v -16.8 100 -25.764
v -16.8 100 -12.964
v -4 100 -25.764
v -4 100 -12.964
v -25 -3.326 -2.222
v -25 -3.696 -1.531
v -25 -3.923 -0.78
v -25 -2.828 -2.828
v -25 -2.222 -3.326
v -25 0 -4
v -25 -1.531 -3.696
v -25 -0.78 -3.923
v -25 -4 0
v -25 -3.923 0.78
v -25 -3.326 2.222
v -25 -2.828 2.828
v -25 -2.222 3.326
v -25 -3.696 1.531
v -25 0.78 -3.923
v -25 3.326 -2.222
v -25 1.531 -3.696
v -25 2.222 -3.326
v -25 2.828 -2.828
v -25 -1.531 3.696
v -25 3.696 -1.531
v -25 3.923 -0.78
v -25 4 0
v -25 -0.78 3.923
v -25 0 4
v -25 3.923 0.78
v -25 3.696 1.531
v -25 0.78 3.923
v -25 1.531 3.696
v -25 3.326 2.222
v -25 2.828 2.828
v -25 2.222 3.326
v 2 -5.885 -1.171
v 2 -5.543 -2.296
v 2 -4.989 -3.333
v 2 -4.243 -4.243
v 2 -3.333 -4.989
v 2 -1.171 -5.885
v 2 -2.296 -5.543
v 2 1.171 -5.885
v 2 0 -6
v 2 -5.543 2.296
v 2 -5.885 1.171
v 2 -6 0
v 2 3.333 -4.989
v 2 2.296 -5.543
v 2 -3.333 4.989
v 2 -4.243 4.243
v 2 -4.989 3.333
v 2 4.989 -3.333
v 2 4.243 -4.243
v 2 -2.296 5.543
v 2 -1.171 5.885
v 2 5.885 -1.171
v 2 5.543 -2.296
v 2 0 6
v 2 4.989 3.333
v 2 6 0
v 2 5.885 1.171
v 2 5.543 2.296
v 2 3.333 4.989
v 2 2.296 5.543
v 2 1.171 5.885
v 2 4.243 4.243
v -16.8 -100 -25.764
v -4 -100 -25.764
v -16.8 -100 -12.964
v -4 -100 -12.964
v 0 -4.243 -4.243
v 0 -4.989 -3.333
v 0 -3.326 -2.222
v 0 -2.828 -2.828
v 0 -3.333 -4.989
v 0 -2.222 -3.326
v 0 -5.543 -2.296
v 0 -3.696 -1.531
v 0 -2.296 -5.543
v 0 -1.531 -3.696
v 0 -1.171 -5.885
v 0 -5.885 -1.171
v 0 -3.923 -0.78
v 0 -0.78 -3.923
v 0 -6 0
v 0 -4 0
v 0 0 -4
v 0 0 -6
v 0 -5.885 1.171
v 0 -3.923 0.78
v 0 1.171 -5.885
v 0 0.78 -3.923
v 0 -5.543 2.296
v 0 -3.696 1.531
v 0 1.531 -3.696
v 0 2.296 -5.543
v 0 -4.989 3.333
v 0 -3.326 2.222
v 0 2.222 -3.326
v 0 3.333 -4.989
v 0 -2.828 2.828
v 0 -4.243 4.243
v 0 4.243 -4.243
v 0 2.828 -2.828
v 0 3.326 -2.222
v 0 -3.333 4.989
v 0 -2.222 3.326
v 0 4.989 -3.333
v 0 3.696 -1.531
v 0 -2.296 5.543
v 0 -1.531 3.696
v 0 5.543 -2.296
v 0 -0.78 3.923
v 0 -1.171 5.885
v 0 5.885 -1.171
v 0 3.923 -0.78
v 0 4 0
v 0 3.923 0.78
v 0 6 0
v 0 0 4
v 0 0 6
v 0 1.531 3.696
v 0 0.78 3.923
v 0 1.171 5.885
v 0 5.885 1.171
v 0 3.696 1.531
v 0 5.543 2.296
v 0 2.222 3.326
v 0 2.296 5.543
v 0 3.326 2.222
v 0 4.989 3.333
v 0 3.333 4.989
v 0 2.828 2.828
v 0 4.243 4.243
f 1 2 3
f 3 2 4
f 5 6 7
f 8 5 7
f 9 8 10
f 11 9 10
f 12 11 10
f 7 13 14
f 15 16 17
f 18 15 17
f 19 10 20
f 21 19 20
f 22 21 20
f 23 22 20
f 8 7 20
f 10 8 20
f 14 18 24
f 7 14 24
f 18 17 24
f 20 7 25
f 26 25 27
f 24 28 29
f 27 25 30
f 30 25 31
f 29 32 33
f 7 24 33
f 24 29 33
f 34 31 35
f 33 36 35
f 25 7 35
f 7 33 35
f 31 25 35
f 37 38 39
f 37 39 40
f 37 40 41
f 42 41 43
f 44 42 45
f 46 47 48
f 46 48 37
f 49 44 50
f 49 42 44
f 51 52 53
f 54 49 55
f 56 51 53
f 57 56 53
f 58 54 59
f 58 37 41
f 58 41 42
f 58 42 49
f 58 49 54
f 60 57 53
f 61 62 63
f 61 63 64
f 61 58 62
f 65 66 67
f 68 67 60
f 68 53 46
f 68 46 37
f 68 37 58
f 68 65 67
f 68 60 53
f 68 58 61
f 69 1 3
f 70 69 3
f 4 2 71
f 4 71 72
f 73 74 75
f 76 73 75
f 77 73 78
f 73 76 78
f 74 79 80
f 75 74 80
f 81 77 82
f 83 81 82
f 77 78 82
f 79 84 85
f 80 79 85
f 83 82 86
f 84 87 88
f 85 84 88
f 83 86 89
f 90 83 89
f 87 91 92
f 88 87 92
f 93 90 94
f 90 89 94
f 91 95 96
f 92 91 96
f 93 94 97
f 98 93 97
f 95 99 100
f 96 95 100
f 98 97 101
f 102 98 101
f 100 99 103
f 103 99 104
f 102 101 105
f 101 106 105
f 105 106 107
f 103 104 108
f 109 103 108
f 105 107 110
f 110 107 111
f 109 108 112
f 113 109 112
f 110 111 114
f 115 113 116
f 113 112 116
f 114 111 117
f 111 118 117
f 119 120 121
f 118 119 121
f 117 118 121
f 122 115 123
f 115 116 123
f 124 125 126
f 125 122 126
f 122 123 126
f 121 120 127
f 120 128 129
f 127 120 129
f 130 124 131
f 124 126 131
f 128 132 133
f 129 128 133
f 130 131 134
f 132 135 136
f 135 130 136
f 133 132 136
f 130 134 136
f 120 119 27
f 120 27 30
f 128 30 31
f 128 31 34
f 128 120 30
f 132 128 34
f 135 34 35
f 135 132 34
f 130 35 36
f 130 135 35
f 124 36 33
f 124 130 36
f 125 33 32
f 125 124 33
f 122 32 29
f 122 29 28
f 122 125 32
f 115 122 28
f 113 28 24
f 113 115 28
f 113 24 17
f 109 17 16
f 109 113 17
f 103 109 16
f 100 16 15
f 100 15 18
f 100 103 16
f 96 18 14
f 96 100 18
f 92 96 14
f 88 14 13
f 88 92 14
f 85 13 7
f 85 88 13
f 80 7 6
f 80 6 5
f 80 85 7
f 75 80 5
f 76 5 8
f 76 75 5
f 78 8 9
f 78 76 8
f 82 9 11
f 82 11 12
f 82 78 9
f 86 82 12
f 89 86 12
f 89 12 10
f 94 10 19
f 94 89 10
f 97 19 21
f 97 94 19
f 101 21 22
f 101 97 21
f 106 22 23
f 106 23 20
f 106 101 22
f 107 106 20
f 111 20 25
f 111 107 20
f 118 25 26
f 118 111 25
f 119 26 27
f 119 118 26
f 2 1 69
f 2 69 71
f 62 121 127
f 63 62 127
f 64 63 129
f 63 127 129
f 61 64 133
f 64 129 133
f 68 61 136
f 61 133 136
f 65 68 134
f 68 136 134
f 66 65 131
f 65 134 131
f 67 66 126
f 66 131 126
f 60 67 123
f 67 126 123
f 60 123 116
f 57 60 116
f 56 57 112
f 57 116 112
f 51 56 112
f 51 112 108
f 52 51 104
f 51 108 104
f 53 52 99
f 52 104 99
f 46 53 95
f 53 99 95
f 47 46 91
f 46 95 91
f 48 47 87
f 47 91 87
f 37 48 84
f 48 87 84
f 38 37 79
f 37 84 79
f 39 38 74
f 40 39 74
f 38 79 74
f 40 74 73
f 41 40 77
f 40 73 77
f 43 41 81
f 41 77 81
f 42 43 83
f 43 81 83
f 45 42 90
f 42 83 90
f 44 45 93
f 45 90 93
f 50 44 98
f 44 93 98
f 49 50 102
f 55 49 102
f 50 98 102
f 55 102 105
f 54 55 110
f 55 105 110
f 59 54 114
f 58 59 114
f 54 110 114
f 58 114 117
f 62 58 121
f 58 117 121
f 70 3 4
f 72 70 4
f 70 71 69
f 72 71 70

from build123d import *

# Parameters (mm, degrees)
F0_R      = 6
F1_DEPTH  = 2
F2_R      = 4
F3_DEPTH  = 25
F9_W      = 12.8
F9_H      = 12.8
F10_DEPTH = 100
F11_DEPTH = 200


# Not quite as in the source:
# - the program builds the solid bodies; features that only make, move or delete a surface that nothing else refers to are left out


with BuildPart() as f1:
    # F0 (on Right) → F1 (new body)
    with BuildSketch(Plane.YZ):
        Circle(F0_R)
    extrude(amount=F1_DEPTH)

    # F2 (on Right) → F3 (join)
    with BuildSketch(Plane.YZ):
        Circle(F2_R)
    extrude(amount=-F3_DEPTH)


with BuildPart() as f10:
    # F9 (on Front) → F10 (new body)
    with BuildSketch(Plane.XZ):
        with Locations((-10.4, -19.3641381563)):
            Rectangle(F9_W, F9_H)
    extrude(amount=F10_DEPTH)

    # F11 (add): a face of the model
    f11_faces = [f10.faces().sort_by_distance(p)[0] for p in [
        (-10.4, -100, -19.3641381563),
    ]]
    extrude(f11_faces, amount=-F11_DEPTH)


solid = Compound([f1.part, f10.part])
